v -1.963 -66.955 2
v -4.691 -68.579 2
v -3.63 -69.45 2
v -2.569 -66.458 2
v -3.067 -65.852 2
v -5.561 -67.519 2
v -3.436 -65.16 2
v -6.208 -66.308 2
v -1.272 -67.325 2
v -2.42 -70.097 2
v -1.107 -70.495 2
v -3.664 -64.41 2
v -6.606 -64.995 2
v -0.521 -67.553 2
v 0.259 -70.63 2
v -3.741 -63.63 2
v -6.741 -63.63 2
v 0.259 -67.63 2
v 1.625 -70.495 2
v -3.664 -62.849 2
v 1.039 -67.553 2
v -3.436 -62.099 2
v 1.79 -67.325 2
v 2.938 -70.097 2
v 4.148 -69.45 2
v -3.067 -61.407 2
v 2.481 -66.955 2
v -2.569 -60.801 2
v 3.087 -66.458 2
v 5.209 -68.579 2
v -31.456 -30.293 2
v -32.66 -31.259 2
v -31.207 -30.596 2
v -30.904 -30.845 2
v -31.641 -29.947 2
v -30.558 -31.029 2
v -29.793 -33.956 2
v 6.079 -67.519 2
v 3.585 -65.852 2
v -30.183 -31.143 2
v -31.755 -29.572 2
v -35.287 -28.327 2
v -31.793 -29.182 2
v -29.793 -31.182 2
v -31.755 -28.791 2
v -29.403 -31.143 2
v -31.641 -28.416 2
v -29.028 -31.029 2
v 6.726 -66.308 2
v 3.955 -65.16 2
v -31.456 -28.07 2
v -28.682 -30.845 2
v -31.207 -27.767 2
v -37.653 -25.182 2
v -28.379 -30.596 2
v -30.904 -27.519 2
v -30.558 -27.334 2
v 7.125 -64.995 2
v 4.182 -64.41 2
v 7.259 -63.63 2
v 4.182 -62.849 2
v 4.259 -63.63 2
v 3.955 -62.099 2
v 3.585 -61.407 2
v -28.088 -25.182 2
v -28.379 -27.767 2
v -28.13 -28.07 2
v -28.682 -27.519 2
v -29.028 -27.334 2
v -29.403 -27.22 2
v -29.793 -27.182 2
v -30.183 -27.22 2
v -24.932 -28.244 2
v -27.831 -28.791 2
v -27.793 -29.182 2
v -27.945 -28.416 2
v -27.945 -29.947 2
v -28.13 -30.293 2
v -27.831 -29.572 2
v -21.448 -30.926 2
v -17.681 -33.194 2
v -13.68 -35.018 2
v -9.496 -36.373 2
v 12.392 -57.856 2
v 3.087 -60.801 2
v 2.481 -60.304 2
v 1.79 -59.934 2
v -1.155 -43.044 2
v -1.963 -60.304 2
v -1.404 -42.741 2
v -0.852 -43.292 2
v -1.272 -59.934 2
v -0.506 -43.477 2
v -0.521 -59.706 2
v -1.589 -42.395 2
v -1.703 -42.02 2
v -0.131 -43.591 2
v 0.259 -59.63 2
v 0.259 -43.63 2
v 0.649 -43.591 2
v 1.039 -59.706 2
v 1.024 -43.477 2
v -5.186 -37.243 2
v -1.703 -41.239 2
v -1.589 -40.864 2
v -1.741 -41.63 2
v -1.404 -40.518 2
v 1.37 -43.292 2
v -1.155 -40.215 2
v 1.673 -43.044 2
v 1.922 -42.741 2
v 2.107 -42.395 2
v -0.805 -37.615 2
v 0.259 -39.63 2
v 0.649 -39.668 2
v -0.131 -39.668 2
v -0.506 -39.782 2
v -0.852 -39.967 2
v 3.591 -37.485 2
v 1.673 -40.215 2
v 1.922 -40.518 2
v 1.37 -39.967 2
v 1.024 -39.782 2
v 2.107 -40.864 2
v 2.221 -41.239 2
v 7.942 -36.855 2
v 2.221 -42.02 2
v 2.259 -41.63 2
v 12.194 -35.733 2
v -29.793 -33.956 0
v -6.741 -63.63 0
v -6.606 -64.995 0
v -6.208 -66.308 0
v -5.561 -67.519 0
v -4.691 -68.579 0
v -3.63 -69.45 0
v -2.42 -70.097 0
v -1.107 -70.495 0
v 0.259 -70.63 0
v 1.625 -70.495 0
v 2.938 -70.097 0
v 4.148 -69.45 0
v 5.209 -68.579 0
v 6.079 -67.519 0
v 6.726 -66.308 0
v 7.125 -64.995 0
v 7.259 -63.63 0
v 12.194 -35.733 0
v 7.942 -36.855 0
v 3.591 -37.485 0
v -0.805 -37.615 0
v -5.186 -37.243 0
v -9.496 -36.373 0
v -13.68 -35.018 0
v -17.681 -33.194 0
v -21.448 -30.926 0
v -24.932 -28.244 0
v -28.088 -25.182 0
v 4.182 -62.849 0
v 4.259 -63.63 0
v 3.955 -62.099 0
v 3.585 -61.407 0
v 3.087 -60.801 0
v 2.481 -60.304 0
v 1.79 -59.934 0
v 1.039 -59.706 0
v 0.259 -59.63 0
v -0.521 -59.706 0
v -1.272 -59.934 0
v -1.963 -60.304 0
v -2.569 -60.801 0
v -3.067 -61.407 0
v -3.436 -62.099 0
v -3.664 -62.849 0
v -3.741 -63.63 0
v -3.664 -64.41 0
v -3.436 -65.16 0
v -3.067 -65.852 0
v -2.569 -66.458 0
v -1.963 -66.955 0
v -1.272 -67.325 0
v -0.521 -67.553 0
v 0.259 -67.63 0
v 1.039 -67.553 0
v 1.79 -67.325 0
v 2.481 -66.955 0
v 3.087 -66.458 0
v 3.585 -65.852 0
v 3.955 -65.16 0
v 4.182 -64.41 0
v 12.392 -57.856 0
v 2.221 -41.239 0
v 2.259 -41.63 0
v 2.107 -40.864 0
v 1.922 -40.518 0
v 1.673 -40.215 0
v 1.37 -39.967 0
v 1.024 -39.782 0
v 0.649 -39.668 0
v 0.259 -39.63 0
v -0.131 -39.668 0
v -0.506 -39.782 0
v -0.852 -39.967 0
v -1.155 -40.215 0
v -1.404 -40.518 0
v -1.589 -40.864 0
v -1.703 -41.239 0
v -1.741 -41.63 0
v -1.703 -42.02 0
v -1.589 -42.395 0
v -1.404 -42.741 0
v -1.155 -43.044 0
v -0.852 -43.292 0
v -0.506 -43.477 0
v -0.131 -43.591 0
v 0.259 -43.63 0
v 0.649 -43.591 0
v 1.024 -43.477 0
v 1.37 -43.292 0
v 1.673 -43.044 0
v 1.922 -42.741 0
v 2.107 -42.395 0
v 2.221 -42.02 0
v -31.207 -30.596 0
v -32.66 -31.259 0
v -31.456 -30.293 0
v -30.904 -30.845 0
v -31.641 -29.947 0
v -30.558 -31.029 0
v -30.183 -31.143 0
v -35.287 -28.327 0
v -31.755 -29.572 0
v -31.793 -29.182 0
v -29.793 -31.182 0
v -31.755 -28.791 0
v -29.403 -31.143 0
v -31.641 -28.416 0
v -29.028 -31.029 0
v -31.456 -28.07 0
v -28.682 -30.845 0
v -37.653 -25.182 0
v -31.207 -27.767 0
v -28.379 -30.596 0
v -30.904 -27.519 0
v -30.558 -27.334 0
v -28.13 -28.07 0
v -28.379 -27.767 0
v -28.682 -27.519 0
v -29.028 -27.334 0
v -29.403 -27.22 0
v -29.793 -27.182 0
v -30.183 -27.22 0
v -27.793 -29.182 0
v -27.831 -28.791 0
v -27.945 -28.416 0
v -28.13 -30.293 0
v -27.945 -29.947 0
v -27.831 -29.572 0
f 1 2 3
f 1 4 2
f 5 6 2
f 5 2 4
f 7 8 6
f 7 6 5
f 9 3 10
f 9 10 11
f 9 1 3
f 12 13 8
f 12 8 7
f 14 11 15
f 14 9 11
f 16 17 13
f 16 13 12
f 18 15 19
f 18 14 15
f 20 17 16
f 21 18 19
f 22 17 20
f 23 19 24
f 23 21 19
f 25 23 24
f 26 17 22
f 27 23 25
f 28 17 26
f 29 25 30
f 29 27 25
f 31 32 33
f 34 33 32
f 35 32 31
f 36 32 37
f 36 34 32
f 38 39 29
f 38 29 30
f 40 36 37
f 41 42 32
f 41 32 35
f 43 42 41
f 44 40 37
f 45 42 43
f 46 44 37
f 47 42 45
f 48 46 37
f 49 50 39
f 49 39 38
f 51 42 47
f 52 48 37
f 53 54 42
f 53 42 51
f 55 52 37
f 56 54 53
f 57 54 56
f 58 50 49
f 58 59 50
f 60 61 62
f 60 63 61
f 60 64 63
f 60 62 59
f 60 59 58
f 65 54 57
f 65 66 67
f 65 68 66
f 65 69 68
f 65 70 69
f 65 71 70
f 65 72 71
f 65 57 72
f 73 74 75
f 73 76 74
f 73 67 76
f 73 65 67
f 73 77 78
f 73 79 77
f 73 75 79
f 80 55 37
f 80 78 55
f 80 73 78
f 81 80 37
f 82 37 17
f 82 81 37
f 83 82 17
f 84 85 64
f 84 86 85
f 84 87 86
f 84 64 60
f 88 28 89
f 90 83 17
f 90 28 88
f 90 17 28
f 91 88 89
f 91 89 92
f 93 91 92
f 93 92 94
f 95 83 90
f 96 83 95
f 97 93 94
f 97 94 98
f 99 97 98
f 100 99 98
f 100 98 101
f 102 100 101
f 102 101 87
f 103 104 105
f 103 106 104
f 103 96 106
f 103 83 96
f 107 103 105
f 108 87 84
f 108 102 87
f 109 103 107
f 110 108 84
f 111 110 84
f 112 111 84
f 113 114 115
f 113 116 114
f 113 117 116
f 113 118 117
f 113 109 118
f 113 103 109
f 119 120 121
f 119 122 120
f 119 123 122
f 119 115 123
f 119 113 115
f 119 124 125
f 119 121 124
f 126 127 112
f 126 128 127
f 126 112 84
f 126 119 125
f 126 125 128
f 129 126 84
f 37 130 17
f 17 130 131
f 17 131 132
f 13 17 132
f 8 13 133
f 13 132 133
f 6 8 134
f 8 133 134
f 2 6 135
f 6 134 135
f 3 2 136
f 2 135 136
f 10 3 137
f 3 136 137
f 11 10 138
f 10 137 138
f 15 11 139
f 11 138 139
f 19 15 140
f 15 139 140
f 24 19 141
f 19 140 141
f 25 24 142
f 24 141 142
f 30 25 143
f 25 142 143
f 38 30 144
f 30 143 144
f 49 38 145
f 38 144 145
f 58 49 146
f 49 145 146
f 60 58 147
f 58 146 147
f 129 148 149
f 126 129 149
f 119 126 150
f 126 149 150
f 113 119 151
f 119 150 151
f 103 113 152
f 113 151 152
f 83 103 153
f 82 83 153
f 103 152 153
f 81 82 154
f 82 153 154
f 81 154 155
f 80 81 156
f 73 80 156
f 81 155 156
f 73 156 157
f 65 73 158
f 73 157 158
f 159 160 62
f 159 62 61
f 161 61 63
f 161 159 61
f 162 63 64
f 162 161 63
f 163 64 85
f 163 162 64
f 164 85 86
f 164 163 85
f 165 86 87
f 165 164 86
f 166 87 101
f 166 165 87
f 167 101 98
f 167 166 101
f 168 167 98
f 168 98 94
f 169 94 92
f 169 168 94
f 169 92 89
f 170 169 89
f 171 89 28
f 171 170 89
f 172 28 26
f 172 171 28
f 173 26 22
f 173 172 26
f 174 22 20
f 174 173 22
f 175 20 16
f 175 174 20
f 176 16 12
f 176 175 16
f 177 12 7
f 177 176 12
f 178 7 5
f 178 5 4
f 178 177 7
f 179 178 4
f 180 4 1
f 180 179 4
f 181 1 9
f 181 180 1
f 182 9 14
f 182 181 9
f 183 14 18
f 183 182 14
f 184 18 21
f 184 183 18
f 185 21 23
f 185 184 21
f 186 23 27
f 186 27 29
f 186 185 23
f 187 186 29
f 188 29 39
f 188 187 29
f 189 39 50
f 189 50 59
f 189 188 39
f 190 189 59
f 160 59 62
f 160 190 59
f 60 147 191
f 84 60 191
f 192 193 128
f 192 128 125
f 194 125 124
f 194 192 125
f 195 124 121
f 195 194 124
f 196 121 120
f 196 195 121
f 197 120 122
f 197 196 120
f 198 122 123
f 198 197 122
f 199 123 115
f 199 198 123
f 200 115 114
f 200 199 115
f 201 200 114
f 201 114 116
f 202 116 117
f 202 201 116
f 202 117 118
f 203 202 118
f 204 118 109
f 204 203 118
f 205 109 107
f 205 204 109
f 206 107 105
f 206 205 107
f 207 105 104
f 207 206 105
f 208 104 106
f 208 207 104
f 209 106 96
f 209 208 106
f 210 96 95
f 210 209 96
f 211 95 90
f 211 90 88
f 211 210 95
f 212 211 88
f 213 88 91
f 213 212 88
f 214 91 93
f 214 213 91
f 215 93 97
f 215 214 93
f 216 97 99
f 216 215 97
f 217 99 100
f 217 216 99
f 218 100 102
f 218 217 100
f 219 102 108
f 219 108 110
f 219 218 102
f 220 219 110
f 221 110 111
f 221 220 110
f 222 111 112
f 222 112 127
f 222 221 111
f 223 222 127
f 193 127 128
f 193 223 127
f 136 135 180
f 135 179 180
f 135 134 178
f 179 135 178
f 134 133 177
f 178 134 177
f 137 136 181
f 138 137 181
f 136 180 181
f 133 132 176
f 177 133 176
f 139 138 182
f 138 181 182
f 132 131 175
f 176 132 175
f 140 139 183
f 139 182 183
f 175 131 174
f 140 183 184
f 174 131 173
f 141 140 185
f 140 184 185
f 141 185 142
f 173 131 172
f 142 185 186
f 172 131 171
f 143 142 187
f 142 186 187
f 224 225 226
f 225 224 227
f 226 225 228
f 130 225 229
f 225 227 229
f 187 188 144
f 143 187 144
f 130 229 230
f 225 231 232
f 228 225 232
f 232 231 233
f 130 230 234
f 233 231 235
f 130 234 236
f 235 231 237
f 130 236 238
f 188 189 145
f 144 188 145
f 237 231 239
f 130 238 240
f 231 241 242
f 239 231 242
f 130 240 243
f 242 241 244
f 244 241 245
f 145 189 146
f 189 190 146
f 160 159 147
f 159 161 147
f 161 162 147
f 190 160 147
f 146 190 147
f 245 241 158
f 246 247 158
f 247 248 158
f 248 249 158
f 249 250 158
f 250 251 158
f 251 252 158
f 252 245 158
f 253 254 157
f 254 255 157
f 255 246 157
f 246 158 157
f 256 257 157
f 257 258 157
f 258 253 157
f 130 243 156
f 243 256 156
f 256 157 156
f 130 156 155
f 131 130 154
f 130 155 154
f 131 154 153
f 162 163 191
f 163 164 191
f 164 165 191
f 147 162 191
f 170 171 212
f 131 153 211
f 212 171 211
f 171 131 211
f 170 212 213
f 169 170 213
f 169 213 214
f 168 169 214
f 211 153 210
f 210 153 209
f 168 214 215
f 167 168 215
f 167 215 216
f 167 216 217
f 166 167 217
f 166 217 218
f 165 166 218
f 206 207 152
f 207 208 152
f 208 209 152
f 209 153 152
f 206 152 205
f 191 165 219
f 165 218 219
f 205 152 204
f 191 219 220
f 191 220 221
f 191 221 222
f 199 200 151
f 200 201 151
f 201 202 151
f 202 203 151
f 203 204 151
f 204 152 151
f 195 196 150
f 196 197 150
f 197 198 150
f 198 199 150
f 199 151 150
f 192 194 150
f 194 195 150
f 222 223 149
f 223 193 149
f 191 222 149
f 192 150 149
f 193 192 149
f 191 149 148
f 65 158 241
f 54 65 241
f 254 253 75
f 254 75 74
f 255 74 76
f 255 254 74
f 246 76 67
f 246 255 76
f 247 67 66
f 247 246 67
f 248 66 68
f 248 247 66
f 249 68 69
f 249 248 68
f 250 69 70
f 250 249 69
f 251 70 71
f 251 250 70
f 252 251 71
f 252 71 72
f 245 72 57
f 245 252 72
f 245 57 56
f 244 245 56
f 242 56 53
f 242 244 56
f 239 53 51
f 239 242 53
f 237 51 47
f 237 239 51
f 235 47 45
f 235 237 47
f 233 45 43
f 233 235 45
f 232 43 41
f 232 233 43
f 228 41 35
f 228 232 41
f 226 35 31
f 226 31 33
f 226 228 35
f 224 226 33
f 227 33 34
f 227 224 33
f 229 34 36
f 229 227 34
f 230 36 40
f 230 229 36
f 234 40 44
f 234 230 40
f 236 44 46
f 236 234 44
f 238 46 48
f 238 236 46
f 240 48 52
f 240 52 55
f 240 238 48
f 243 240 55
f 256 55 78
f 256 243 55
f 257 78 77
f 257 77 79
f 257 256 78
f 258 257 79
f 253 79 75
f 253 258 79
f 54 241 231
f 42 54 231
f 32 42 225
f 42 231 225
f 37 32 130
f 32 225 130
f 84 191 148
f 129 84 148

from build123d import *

# Parameters (mm, degrees)
SKETCH_1_R      = 2
SKETCH_1_R_2    = 4
EXTRUDE_1_DEPTH = 2


with BuildPart() as part:
    # 草图1 → 凸台-拉伸1 (new body)
    with BuildSketch(Plane.XY):
        with BuildLine():
            Line((-28.087756532, -25.18156201), (-37.652577321, -25.18156201))
            ThreePointArc((-37.652577321, -25.18156201), (-34.00481141, -29.821346246), (-29.792990581, -33.955878772))
            Line((-29.792990581, -33.955878772), (-6.740952381, -63.62952381))
            ThreePointArc((-6.740952381, -63.62952381), (0.259047619, -70.62952381), (7.259047619, -63.62952381))
            Line((7.259047619, -63.62952381), (12.392004443, -57.856149826))
            Line((12.392004443, -57.856149826), (12.193934029, -35.732918275))
            ThreePointArc((12.193934029, -35.732918275), (-9.496491359, -36.373039477), (-28.087756532, -25.18156201))
        make_face()
        with Locations((0.259047619, -41.62952381)):
            Circle(SKETCH_1_R, mode=Mode.SUBTRACT)
        with Locations((-29.792990581, -29.18156201)):
            Circle(SKETCH_1_R, mode=Mode.SUBTRACT)
        with Locations((0.259047619, -63.62952381)):
            Circle(SKETCH_1_R_2, mode=Mode.SUBTRACT)
    extrude(amount=EXTRUDE_1_DEPTH)


solid = part.part
